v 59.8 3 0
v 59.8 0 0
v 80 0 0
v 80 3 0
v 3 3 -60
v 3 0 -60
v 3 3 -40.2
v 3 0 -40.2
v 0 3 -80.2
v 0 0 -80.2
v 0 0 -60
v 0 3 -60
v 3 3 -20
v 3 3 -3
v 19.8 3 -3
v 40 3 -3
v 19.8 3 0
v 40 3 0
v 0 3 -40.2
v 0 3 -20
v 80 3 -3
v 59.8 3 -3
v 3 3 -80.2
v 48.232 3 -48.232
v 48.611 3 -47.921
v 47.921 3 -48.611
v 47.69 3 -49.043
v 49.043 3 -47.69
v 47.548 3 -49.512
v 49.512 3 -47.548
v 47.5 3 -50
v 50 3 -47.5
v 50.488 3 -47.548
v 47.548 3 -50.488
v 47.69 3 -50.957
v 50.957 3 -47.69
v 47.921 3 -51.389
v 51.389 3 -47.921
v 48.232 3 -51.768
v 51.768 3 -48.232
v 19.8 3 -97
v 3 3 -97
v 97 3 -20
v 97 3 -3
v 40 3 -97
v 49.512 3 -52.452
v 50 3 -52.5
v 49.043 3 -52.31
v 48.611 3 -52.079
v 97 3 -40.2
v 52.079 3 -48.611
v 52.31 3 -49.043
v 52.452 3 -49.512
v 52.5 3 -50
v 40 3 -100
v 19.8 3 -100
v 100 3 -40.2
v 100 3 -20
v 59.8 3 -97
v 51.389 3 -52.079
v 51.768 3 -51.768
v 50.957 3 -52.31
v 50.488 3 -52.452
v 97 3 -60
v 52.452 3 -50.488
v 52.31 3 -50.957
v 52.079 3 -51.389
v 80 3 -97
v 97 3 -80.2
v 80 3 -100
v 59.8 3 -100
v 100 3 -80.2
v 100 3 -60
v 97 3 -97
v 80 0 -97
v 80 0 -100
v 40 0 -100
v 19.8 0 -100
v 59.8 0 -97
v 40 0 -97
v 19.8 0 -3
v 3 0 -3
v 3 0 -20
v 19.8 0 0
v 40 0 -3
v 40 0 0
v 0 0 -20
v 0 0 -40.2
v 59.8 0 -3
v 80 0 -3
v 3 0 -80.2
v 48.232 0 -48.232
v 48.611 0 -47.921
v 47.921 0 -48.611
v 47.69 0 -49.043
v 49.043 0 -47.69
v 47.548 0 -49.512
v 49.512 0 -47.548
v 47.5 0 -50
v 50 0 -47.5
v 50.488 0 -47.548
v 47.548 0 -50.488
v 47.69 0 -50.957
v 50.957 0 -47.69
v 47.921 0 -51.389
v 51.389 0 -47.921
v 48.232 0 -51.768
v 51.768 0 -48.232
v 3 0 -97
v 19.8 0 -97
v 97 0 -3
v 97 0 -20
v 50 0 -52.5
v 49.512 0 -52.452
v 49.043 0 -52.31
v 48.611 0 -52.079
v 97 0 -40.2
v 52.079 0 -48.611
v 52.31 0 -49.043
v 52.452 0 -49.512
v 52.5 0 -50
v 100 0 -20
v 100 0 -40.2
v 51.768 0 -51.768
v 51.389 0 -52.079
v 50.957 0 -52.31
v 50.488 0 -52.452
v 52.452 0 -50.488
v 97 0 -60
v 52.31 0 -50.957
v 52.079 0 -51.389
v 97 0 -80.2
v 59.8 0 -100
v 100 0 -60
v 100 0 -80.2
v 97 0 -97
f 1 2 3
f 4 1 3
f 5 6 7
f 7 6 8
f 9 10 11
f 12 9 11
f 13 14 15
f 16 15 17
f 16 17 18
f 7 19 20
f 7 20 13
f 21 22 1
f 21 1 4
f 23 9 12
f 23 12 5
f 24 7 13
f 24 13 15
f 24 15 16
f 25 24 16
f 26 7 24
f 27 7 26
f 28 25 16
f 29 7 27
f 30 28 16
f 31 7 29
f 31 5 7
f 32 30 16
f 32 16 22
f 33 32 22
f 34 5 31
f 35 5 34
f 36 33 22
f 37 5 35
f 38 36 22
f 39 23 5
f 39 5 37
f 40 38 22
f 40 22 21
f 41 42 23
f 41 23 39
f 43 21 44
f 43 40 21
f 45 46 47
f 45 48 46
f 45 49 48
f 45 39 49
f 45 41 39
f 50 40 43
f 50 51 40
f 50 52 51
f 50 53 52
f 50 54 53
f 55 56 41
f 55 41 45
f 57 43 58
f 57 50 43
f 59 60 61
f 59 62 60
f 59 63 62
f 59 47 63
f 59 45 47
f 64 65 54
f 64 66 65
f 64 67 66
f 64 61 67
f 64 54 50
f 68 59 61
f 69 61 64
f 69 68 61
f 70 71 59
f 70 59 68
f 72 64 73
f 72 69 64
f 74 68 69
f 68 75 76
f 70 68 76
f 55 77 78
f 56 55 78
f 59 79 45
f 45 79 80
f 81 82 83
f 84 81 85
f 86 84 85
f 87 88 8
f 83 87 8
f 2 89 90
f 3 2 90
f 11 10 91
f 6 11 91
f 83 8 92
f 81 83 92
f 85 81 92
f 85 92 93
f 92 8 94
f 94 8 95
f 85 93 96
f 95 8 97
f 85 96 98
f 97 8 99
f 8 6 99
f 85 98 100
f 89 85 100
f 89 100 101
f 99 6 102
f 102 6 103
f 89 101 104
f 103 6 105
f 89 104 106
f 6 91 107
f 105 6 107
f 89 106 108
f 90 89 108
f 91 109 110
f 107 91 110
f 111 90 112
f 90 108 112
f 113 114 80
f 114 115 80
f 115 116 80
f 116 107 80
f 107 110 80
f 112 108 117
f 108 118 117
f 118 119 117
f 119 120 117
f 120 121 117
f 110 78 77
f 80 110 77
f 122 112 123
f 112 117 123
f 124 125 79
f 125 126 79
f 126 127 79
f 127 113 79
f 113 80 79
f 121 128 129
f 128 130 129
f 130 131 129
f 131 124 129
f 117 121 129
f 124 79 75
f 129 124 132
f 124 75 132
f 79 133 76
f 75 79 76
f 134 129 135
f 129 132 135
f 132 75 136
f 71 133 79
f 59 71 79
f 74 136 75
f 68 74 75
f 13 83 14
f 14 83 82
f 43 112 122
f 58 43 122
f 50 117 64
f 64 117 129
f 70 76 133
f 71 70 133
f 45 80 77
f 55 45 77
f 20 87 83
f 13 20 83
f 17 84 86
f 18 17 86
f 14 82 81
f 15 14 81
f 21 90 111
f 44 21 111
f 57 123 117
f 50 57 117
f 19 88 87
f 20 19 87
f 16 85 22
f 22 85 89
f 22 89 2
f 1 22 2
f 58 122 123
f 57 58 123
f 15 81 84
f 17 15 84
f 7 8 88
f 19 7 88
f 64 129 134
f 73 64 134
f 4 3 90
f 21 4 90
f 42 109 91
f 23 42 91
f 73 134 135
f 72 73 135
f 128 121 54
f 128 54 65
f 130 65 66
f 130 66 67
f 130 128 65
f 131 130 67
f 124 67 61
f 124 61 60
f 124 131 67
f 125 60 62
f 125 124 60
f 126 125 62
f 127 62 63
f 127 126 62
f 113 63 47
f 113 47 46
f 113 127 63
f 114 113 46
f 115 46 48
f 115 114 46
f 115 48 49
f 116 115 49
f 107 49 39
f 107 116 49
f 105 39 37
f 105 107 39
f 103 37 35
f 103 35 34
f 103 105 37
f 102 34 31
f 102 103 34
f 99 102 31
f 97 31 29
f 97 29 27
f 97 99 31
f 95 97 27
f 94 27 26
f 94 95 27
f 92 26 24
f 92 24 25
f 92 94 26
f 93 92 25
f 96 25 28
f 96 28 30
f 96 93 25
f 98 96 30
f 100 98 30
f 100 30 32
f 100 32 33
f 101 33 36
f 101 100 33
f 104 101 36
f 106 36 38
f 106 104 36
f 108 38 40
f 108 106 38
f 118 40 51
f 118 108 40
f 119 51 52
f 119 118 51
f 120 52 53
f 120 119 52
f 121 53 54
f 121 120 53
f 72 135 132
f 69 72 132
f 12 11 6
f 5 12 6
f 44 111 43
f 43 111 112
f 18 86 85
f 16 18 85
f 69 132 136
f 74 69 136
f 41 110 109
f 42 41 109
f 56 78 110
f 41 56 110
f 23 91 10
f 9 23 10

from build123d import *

# Parameters (mm, degrees)
SKETCH1_R           = 2.5
BOSS_EXTRUDE1_DEPTH = 3


with BuildPart() as part:
    # Sketch1 → Boss-Extrude1 (new body)
    with BuildSketch(Plane(origin=(0, 0, 0), x_dir=(1, 0, 0), z_dir=(0, 1, 0))):
        Polygon((59.8, 97), (40, 97), (40, 100), (19.8, 100), (19.8, 97), (3, 97), (3, 80.2), (0, 80.2), (0, 60), (3, 60), (3, 40.2), (0, 40.2), (0, 20), (3, 20), (3, 3), (19.8, 3), (19.8, 0), (40, 0), (40, 3), (59.8, 3), (59.8, 0), (80, 0), (80, 3), (97, 3), (97, 20), (100, 20), (100, 40.2), (97, 40.2), (97, 60), (100, 60), (100, 80.2), (97, 80.2), (97, 97), (80, 97), (80, 100), (59.8, 100), align=None)
        with Locations((50, 50)):
            Circle(SKETCH1_R, mode=Mode.SUBTRACT)
    extrude(amount=BOSS_EXTRUDE1_DEPTH)


solid = part.part
